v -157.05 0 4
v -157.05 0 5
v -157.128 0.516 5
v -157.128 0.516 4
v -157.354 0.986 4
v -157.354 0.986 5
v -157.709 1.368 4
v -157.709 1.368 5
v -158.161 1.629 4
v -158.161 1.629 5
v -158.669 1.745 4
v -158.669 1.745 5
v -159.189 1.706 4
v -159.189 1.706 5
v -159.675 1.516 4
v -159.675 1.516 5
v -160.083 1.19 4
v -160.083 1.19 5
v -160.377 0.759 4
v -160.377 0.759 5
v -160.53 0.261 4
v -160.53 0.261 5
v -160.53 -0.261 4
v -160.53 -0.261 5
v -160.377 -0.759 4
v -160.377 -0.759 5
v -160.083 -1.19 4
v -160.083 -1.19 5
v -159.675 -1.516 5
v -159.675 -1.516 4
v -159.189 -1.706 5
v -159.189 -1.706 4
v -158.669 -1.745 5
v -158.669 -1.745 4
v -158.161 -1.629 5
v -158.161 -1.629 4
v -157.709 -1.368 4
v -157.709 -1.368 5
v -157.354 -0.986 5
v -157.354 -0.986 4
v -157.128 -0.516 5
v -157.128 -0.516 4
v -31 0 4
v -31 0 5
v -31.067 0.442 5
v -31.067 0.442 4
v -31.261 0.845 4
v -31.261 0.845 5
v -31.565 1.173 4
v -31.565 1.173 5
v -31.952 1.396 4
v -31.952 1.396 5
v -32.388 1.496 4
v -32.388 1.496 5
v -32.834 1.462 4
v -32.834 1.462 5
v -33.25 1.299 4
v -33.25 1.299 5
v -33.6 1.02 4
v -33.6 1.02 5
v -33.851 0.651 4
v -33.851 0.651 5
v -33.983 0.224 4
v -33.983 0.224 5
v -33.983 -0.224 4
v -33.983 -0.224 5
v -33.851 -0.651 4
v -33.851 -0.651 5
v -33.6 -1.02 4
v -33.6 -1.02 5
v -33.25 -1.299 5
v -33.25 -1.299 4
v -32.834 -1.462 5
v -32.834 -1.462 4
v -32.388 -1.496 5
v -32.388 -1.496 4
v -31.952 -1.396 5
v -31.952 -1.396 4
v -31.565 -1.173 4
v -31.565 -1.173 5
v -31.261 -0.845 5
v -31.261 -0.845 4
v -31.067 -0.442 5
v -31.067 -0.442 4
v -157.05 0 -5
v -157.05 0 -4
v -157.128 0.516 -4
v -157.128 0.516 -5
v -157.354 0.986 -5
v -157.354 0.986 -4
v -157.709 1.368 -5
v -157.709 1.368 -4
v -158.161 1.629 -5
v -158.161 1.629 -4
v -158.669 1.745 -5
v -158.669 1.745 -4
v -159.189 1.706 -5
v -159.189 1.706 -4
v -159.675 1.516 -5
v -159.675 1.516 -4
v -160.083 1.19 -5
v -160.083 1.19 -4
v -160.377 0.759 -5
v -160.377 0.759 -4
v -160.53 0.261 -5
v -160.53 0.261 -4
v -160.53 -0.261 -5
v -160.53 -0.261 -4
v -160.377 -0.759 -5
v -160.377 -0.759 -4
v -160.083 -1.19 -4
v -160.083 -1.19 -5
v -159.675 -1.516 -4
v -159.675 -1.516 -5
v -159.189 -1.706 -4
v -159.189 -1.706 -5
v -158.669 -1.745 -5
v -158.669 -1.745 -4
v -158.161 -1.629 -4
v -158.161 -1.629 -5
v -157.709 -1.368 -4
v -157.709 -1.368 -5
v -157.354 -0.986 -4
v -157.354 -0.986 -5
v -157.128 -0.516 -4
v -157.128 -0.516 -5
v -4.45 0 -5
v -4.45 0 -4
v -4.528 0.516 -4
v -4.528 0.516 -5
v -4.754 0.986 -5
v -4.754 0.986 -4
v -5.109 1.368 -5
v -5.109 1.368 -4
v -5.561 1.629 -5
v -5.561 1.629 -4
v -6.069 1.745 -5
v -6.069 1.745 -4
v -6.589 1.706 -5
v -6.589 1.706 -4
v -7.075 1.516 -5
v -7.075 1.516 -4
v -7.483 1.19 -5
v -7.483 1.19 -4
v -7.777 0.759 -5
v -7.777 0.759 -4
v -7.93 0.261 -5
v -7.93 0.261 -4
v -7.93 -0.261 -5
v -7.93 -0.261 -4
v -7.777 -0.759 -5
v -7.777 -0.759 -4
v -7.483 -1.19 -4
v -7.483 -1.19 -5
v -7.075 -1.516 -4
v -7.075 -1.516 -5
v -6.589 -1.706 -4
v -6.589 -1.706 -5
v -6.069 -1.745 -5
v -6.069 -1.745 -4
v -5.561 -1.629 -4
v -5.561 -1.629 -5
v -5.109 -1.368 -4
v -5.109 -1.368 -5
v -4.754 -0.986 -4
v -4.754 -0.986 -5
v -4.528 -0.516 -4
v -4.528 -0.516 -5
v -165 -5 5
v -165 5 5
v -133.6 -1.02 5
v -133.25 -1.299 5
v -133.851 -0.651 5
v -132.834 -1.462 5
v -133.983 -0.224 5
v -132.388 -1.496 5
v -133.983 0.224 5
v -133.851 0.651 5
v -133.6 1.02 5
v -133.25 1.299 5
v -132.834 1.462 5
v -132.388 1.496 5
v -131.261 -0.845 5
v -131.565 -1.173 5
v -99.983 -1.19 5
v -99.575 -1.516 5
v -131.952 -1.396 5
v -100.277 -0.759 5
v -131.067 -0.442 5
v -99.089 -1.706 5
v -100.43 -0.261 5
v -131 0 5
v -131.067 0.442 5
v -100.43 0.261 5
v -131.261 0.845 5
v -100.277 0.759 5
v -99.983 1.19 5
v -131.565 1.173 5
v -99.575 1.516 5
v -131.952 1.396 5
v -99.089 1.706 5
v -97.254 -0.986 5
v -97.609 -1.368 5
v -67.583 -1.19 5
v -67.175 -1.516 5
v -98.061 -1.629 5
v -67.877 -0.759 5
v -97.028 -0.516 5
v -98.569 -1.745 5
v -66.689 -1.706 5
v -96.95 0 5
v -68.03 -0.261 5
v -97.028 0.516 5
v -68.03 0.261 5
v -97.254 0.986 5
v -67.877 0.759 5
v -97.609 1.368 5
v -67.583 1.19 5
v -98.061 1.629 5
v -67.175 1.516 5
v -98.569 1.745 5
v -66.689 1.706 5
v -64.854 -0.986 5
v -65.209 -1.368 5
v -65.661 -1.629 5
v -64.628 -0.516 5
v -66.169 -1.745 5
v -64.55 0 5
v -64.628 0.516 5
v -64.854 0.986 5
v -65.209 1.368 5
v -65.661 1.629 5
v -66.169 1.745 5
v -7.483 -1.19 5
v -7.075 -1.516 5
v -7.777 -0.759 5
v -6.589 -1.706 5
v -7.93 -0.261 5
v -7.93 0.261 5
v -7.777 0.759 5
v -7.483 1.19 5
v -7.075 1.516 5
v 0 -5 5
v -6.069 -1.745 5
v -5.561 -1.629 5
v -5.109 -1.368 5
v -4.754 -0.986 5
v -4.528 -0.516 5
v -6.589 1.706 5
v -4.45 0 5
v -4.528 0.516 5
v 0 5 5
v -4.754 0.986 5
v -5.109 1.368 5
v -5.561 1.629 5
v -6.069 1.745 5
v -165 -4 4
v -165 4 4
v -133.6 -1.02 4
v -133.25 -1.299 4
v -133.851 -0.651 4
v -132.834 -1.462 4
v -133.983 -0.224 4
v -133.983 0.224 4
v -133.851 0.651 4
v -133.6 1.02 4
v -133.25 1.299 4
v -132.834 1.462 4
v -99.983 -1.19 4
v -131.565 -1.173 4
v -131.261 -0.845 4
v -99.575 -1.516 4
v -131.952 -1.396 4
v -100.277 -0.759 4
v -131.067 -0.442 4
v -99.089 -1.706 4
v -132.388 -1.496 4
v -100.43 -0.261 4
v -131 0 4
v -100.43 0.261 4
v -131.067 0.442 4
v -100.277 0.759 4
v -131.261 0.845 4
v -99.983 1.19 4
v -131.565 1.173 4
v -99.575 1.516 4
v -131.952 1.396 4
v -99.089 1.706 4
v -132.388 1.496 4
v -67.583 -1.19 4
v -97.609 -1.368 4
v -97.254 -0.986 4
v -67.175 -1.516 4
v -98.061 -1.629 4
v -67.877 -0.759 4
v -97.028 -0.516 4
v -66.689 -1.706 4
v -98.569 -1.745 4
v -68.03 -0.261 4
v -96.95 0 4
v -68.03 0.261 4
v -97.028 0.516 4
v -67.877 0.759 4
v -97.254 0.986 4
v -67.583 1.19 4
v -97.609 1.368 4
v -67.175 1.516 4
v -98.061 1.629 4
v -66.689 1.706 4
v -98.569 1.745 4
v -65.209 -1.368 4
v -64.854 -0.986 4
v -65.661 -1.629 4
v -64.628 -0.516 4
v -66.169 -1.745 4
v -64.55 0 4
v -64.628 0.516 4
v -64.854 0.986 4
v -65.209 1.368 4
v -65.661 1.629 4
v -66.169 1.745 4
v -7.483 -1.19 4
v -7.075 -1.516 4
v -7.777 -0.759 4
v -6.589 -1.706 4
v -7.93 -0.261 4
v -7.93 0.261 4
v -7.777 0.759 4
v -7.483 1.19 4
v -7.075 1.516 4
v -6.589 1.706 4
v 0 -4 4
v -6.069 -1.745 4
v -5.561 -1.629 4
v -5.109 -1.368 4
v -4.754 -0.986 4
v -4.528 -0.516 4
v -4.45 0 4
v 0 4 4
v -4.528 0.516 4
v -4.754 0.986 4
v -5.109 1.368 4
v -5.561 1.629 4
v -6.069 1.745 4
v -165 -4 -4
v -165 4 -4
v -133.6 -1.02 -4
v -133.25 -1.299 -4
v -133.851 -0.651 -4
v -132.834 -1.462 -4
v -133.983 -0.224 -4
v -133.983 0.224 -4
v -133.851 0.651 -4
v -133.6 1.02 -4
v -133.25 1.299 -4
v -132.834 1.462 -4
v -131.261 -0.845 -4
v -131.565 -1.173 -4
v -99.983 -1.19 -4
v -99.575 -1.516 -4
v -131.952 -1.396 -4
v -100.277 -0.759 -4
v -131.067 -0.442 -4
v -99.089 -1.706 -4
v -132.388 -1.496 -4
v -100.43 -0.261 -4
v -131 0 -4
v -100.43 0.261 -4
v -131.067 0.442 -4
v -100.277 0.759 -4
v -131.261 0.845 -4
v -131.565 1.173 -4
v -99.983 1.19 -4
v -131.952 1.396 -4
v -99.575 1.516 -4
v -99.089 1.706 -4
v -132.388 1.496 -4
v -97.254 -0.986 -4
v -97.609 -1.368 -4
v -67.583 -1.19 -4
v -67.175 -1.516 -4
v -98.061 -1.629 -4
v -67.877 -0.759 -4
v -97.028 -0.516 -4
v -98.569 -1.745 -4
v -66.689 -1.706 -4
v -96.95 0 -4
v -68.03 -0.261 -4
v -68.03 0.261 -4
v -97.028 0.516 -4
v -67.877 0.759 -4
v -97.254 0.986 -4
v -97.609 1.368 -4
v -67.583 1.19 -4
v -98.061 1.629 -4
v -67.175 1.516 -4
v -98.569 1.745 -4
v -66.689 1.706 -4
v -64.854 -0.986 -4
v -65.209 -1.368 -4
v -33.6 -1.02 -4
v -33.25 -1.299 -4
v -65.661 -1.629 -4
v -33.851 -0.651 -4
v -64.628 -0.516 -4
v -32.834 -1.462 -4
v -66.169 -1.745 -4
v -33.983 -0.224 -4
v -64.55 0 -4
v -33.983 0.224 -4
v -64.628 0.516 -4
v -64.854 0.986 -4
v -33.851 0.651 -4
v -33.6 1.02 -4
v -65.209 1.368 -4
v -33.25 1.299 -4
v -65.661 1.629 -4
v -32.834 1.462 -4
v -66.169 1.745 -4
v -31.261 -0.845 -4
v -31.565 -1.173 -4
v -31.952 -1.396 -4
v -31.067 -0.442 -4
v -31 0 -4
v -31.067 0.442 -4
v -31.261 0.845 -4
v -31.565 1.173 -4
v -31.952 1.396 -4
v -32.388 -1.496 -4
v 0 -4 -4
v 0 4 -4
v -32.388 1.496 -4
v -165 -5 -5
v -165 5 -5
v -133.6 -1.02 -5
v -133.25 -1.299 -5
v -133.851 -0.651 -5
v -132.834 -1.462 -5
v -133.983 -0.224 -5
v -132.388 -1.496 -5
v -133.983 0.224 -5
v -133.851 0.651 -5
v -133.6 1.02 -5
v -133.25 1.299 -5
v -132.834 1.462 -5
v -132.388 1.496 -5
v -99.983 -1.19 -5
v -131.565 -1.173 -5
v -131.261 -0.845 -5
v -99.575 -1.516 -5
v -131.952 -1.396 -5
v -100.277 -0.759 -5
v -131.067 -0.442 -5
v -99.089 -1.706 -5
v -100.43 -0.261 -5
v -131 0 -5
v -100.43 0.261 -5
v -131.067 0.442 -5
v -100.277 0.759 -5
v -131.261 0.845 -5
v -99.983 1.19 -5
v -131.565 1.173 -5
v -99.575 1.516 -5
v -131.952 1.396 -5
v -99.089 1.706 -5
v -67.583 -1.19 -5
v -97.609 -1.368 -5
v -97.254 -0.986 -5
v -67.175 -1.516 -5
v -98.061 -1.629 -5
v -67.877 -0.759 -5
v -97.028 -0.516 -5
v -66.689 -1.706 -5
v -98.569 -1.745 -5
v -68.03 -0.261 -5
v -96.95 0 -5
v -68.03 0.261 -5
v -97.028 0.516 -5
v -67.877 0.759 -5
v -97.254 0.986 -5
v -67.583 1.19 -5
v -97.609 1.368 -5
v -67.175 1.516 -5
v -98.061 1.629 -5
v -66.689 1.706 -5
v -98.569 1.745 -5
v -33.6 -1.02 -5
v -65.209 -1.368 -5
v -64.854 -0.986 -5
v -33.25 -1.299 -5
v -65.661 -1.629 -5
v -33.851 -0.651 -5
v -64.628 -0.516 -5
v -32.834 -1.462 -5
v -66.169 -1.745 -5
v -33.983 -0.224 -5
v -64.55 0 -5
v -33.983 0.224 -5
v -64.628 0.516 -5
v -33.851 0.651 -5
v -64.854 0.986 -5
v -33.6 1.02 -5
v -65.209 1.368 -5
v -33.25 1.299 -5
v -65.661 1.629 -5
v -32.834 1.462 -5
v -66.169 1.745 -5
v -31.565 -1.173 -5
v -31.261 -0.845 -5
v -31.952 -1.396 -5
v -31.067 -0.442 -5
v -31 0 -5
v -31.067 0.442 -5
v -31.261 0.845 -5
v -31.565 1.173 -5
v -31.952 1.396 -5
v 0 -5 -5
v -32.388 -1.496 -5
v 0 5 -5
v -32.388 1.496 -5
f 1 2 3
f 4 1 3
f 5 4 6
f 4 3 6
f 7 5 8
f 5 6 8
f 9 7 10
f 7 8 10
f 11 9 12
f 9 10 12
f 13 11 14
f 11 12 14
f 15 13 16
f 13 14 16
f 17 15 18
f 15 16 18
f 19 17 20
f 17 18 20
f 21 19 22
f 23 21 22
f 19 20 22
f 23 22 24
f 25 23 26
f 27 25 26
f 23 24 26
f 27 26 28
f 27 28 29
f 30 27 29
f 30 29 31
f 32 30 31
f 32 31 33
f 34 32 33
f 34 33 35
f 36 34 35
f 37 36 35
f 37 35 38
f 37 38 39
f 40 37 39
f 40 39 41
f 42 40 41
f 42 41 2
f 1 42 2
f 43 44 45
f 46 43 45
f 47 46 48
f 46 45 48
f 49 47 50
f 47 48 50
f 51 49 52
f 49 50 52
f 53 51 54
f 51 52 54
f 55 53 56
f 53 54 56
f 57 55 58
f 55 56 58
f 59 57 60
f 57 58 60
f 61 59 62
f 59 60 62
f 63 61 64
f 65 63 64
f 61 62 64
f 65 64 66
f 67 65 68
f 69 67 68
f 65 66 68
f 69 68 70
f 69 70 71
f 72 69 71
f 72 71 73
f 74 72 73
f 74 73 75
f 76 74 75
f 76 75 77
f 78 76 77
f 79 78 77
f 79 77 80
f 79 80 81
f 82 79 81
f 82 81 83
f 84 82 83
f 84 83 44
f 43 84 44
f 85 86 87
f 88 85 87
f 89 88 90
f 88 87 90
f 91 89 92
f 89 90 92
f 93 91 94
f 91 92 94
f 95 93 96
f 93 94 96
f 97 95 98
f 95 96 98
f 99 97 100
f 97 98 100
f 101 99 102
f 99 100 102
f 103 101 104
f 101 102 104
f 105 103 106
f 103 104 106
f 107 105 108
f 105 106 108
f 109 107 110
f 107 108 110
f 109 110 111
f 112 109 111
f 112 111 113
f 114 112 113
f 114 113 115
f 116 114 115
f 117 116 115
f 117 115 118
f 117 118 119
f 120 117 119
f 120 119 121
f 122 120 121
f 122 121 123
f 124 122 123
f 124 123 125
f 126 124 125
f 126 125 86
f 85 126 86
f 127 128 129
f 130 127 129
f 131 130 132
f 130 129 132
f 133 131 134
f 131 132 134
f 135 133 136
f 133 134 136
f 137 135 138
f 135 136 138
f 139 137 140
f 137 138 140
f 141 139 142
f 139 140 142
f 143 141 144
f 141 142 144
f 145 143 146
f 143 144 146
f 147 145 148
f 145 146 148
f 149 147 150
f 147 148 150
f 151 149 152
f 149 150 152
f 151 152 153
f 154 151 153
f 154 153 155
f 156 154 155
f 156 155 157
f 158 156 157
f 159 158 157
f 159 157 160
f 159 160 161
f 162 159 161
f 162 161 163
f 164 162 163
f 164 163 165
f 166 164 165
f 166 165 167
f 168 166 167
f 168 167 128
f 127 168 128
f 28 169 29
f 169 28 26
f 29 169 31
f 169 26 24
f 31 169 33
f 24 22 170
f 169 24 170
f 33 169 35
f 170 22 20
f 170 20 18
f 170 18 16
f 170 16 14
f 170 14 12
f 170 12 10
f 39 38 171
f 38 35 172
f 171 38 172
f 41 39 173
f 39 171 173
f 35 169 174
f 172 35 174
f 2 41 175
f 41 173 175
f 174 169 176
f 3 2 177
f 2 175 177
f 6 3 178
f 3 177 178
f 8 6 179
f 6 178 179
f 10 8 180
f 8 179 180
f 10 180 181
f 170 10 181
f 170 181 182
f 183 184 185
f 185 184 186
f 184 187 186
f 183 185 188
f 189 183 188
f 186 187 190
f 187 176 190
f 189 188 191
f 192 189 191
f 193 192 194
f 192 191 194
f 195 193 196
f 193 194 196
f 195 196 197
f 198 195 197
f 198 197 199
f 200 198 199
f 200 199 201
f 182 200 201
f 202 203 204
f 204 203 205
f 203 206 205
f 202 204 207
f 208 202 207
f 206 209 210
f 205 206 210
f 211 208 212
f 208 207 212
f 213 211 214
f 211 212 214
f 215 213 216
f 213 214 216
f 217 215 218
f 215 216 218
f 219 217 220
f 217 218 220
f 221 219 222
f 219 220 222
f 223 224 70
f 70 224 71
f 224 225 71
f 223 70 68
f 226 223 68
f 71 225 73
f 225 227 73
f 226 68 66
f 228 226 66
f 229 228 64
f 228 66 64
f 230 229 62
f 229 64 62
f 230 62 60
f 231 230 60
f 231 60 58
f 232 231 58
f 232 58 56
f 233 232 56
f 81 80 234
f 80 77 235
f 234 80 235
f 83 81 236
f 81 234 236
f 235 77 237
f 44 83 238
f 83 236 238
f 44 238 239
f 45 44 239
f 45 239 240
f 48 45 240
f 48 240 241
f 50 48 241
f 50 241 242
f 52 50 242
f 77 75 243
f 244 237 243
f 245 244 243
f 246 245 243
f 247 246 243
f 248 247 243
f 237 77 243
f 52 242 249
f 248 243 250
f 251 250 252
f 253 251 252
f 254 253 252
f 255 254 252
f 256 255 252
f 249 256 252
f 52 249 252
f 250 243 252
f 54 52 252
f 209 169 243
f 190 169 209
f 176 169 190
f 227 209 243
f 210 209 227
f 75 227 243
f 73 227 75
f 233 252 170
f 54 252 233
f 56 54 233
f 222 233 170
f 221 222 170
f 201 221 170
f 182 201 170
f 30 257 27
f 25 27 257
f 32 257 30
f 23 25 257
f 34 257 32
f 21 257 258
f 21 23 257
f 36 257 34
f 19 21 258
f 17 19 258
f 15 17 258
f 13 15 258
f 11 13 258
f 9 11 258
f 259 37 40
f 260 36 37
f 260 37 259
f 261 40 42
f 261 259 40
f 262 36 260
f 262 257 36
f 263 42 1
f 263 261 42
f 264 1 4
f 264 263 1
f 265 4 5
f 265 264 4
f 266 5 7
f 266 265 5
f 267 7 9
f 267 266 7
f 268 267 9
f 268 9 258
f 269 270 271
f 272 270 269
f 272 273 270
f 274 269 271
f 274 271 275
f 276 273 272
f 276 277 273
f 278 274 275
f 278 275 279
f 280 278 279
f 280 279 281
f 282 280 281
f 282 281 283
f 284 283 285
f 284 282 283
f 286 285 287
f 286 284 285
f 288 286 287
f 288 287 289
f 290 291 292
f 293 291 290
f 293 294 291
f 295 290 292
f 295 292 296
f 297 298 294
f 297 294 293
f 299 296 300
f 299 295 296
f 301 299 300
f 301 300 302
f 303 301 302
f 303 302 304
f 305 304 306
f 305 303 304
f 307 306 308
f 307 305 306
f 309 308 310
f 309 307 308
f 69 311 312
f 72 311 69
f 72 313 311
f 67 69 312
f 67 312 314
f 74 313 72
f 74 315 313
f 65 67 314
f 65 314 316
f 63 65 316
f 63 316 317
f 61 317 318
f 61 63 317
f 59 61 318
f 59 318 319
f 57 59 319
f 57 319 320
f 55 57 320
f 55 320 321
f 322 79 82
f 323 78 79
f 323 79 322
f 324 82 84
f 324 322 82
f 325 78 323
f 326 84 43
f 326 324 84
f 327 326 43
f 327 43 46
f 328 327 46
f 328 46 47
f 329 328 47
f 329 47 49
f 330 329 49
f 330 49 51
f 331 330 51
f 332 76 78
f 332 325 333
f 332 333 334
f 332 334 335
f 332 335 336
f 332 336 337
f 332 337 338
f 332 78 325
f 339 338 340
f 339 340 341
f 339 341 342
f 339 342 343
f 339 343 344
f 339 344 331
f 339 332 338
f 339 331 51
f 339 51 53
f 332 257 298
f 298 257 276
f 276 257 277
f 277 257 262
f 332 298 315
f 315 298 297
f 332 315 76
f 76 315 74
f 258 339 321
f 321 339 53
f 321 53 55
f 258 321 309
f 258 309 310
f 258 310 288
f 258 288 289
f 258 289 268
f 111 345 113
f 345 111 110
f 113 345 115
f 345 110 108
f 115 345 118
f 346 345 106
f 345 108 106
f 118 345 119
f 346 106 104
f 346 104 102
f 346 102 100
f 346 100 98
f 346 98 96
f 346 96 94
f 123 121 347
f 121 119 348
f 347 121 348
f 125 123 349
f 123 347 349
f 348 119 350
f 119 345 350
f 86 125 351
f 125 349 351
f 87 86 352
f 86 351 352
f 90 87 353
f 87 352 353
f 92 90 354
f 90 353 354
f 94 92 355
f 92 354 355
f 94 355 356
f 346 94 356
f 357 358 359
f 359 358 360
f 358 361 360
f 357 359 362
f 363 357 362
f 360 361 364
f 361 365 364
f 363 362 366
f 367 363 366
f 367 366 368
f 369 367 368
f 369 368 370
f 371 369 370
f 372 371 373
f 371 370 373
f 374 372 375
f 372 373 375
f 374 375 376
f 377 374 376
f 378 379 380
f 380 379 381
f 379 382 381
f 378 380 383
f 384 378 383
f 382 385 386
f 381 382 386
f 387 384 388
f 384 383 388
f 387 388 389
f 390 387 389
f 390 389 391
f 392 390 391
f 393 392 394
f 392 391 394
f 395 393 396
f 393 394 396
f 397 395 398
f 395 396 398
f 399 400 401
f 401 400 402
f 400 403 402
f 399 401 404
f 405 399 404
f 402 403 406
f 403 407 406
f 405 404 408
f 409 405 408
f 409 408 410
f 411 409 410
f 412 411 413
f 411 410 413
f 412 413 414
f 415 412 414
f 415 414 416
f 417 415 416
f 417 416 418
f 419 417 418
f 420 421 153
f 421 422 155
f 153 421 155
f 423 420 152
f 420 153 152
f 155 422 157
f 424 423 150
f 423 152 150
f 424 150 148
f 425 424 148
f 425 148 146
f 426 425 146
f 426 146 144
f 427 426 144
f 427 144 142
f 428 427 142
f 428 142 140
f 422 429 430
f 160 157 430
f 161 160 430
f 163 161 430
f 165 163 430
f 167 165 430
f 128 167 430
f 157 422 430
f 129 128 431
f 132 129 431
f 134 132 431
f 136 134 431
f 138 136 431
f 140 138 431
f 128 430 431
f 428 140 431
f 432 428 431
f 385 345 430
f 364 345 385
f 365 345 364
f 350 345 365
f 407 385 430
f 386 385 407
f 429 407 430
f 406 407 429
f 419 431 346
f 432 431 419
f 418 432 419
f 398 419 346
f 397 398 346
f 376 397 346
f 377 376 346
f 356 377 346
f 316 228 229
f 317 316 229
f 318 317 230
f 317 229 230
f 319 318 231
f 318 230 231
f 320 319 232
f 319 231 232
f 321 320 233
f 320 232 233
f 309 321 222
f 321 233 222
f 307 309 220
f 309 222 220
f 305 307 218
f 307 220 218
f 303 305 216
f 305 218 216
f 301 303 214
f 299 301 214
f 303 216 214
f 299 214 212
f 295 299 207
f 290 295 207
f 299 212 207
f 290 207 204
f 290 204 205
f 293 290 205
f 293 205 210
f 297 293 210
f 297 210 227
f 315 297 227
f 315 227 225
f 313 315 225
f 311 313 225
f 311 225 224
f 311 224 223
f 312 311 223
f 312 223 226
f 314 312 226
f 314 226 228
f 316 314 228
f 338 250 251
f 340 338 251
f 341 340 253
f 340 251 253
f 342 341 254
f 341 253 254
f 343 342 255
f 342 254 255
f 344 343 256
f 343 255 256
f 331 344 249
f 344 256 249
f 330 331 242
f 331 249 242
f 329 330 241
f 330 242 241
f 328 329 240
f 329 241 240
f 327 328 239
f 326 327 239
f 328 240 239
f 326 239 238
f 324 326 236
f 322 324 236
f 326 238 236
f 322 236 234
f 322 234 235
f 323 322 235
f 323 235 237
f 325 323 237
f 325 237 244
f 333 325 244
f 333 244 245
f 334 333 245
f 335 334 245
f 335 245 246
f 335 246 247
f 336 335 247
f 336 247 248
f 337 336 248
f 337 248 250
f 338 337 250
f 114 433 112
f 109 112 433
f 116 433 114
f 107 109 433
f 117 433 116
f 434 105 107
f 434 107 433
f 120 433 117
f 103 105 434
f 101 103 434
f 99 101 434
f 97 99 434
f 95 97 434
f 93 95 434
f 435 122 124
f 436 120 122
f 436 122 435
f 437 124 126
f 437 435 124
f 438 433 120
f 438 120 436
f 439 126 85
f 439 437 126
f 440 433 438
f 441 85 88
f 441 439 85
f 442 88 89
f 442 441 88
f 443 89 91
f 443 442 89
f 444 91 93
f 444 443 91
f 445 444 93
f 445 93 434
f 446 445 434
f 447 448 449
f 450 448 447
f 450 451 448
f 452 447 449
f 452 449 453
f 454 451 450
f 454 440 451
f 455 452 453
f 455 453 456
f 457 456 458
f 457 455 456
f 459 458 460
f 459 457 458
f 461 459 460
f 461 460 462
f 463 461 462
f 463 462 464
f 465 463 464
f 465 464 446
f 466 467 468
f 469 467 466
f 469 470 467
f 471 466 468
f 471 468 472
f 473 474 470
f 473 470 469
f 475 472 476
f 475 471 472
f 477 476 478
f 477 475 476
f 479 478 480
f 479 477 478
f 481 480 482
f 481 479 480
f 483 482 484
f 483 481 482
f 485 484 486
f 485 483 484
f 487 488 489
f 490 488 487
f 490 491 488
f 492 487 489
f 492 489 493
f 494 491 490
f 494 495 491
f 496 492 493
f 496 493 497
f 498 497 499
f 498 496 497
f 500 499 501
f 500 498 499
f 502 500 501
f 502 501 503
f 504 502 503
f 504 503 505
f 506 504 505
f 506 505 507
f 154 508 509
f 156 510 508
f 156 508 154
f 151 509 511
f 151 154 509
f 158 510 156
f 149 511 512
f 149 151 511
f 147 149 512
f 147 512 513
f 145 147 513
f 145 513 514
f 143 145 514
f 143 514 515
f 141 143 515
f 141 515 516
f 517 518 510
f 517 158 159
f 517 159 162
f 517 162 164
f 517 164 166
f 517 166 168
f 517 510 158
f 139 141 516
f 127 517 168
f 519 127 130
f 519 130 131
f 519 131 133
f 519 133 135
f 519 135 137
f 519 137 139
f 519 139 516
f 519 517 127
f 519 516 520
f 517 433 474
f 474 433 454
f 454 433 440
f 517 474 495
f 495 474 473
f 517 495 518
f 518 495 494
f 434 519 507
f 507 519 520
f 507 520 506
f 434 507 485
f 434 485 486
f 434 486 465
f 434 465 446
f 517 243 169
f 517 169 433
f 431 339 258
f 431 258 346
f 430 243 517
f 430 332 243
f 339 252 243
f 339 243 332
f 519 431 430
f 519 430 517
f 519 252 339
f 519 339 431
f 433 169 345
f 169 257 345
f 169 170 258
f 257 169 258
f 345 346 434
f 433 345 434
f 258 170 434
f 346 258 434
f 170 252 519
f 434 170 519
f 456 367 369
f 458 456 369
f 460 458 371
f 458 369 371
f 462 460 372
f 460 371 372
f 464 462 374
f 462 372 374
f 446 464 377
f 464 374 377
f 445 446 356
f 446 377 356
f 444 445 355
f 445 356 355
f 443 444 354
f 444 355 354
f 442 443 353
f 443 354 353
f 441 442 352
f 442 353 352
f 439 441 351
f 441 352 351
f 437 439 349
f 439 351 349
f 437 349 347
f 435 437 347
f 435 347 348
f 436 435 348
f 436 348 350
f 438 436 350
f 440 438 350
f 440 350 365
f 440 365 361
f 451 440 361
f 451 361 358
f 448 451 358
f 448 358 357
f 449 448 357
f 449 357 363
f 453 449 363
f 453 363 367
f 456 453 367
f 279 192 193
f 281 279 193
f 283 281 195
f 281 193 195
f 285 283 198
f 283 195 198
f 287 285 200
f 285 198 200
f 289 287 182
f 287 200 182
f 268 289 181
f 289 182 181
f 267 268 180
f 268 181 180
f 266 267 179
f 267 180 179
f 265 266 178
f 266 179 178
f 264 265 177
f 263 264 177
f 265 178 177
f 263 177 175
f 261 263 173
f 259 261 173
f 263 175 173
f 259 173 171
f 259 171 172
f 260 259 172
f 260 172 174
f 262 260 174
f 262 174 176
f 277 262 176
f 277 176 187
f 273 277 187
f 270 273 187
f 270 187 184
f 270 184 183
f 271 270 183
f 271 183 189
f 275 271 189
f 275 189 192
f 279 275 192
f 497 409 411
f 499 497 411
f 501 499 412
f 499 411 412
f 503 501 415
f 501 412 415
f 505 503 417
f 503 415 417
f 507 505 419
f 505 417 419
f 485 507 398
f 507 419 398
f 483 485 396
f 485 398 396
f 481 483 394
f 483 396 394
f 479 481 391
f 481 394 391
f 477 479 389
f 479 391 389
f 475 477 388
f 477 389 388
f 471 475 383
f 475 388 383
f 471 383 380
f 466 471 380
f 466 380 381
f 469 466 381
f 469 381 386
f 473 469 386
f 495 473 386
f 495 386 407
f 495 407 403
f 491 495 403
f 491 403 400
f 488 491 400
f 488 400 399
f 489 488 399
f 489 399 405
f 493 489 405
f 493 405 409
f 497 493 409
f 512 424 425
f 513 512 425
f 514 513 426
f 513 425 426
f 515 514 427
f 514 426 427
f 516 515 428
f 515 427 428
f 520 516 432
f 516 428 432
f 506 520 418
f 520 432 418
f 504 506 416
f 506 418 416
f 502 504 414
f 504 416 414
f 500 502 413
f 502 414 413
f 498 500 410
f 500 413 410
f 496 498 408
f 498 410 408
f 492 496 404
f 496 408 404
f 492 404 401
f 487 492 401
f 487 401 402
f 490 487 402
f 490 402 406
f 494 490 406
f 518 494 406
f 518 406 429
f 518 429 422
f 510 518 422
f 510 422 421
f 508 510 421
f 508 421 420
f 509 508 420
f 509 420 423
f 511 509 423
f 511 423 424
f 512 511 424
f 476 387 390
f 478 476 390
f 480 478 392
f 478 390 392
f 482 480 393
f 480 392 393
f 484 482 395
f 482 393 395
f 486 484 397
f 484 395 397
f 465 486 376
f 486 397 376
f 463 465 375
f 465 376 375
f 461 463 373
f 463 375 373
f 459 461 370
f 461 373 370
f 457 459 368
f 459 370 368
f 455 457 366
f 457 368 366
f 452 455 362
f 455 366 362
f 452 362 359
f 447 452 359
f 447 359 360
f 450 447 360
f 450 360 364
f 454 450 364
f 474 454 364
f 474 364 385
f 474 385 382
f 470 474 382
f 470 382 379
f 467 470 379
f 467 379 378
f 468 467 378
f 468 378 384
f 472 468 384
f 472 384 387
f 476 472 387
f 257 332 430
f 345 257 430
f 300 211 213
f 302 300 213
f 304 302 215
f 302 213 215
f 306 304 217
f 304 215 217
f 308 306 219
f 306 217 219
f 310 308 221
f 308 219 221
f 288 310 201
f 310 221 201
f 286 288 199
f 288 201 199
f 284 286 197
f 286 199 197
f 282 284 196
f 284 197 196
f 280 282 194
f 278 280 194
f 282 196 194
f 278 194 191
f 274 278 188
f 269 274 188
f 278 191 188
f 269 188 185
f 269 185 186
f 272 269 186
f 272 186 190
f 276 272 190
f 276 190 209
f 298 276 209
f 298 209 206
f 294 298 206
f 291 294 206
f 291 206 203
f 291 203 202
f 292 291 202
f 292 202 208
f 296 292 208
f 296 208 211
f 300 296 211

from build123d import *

# Parameters (mm, degrees)
SKETCH_2_W          = 10
SKETCH_2_H          = 10
SKETCH_2_W_2        = 8
SKETCH_2_H_2        = 8
EXTRUDE_1_DEPTH     = 165
SKETCH_3_R          = 1.75
SKETCH_3_R_2        = 1.5
CUT_EXTRUDE_1_DEPTH = 11


with BuildPart() as part:
    # 草图2 → 拉伸-薄壁1 (new body)
    with BuildSketch(Plane(origin=(0, 0, 0), x_dir=(0, 0, -1), z_dir=(1, 0, 0))):
        Rectangle(SKETCH_2_W, SKETCH_2_H)
        Rectangle(SKETCH_2_W_2, SKETCH_2_H_2, mode=Mode.SUBTRACT)
    extrude(amount=-EXTRUDE_1_DEPTH)

    # 草图3 → 切除-拉伸1 (cut, through all)
    with BuildSketch(Plane.XY.offset(5)):
        with Locations((-6.2, 0)):
            Circle(SKETCH_3_R)
        with Locations((-158.8, 0)):
            Circle(SKETCH_3_R)
        with Locations((-32.5, 0)):
            Circle(SKETCH_3_R_2)
        with Locations((-132.5, 0)):
            Circle(SKETCH_3_R_2)
        with Locations((-66.3, 0)):
            Circle(SKETCH_3_R)
        with Locations((-98.7, 0)):
            Circle(SKETCH_3_R)
    extrude(amount=-CUT_EXTRUDE_1_DEPTH, mode=Mode.SUBTRACT)


solid = part.part
